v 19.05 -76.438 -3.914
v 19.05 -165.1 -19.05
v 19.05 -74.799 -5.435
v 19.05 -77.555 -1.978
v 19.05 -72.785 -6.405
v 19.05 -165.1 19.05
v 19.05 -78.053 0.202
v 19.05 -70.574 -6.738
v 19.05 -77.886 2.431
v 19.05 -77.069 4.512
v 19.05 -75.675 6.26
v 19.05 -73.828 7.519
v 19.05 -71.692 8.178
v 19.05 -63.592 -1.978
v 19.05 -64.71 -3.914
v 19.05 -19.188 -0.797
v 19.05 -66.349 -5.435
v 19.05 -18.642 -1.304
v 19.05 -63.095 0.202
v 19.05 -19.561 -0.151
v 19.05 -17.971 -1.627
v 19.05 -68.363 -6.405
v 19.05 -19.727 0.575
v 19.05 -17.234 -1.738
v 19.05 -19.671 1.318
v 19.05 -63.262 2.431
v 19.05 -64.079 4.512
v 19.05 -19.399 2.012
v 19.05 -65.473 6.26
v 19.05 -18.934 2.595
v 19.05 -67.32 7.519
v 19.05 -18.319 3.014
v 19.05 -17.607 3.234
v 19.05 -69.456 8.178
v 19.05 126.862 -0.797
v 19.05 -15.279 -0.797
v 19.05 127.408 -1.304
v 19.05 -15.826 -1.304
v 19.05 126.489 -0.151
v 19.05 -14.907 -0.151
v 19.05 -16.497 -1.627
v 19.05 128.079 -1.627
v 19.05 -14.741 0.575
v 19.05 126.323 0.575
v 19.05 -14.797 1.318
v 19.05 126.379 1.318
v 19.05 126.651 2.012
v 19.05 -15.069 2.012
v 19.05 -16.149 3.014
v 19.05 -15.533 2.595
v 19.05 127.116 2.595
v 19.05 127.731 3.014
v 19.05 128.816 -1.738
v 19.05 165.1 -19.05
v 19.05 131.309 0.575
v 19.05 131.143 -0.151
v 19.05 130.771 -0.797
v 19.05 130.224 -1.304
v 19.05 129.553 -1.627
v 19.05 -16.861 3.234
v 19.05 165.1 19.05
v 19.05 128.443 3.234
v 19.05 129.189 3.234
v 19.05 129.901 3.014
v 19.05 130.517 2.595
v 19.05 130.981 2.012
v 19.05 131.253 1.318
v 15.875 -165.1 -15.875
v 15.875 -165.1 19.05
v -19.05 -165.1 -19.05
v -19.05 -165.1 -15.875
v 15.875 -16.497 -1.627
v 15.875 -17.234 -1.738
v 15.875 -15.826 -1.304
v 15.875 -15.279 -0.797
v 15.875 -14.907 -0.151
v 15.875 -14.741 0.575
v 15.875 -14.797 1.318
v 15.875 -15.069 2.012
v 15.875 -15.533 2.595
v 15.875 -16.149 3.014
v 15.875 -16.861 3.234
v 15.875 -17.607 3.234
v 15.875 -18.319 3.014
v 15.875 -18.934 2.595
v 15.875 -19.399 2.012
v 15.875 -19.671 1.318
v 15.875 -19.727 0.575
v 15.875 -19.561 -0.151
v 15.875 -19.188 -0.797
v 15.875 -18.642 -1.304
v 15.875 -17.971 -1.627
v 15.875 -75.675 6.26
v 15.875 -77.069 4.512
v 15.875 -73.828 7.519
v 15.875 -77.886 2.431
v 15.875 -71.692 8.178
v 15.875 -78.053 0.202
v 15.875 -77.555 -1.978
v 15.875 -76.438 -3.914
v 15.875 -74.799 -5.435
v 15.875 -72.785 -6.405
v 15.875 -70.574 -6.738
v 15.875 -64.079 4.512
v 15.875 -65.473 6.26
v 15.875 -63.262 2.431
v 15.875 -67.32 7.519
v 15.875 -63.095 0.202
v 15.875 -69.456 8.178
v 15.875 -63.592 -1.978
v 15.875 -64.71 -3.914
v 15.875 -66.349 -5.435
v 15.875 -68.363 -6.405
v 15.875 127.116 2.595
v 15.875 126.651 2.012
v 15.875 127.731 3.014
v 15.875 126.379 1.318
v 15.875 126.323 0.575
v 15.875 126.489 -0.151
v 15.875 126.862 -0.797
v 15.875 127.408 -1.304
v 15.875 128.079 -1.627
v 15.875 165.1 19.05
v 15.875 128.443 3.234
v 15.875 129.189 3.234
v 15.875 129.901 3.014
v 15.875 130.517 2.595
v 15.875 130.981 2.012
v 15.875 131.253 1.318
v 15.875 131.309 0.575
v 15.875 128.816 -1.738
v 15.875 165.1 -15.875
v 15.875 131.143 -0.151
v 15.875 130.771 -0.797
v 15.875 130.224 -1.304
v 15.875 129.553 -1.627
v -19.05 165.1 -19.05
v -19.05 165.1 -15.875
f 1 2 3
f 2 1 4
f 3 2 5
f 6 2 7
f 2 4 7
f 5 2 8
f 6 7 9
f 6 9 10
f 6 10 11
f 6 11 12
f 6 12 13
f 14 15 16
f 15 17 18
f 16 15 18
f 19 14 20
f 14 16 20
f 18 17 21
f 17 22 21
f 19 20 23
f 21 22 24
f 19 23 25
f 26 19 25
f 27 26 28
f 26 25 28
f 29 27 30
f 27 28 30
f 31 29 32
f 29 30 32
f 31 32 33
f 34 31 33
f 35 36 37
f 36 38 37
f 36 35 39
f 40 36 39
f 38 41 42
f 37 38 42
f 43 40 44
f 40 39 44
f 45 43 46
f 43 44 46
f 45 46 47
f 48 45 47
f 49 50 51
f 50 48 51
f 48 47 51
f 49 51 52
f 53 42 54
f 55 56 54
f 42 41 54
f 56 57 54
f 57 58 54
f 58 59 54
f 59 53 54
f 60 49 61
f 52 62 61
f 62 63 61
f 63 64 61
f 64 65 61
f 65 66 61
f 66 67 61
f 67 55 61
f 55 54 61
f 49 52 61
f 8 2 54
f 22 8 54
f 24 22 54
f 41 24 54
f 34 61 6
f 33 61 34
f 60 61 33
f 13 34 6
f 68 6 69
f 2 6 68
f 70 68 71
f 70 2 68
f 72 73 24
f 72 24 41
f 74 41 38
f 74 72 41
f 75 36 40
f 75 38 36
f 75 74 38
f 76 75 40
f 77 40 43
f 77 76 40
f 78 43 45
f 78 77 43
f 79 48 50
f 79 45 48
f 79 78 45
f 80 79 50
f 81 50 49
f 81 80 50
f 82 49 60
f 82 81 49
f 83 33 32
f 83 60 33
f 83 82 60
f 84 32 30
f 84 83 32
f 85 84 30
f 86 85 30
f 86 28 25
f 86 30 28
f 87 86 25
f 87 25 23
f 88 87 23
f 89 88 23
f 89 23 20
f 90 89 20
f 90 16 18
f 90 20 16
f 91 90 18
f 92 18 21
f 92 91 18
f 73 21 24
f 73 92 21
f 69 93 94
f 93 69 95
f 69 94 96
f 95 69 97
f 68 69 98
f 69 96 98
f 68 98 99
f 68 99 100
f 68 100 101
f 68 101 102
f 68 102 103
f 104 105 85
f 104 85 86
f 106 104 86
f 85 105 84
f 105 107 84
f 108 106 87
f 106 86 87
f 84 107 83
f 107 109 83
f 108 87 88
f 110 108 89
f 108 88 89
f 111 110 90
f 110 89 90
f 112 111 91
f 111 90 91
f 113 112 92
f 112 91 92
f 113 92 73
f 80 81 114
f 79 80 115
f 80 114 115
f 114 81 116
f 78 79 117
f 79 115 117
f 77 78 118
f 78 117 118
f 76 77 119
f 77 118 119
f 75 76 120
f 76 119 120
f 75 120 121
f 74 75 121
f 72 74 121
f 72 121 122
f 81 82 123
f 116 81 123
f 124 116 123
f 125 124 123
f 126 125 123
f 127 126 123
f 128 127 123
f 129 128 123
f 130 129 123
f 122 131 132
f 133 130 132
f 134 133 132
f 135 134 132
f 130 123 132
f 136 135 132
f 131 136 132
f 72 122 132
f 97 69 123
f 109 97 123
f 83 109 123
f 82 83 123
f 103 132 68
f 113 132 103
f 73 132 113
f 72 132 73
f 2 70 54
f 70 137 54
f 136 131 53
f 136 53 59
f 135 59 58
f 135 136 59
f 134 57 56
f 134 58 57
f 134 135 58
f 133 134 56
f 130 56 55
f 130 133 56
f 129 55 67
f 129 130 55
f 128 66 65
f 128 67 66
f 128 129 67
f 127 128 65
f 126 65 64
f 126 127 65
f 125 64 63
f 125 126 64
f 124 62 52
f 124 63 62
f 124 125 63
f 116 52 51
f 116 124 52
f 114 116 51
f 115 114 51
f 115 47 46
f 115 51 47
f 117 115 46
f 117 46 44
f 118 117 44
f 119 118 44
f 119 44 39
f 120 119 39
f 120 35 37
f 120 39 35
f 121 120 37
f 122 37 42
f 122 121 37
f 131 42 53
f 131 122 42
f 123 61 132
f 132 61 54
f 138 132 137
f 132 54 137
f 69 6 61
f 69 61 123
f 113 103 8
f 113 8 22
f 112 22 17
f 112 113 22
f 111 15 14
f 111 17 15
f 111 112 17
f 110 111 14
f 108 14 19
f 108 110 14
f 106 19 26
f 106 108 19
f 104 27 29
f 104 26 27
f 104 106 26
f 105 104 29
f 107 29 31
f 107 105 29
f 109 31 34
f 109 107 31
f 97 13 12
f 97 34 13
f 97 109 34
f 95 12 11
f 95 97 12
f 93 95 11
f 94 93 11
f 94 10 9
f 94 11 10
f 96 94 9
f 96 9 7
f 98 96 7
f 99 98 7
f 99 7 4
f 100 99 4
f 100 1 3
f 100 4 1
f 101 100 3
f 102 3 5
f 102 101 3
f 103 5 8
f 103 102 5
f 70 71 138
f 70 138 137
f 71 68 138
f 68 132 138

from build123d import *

# Parameters (mm, degrees)
BOSS_EXTRUDE1_DEPTH     = 165.1
CUT_EXTRUDE1_DEPTH      = 171.506664093
CUT_EXTRUDE1_DEPTH_BACK = 171.506664093
SKETCH2_R               = 2.5
SKETCH2_R_2             = 7.5


with BuildPart() as part:
    # Sketch1 → Boss-Extrude1 (new, symmetric)
    with BuildSketch(Plane(origin=(0, 0, 0), x_dir=(1, 0, 0), z_dir=(0, 1, 0))):
        Polygon((15.875, -19.05), (15.875, 15.875), (-19.05, 15.875), (-19.05, 19.05), (19.05, 19.05), (19.05, -19.05), align=None)
    extrude(amount=BOSS_EXTRUDE1_DEPTH, both=True)

    # Sketch2 → Cut-Extrude1 (cut, two sides: drawn at the far end of the back side and taken through both)
    with BuildSketch(Plane(origin=(19.05, 0, 0), x_dir=(0, 0, -1), z_dir=(1, 0, 0)).offset(-CUT_EXTRUDE1_DEPTH_BACK)):
        with Locations((-32.722, 128.8161)):
            Circle(SKETCH2_R)
        with Locations((-32.722, 201.3839)):
            Circle(SKETCH2_R_2)
        with Locations((-32.722, -17.2339)):
            Circle(SKETCH2_R)
        with Locations((-32.722, -70.5739)):
            Circle(SKETCH2_R_2)
        with Locations((-0.762, -70.5739)):
            Circle(SKETCH2_R_2)
        with Locations((-0.762, 201.3839)):
            Circle(SKETCH2_R_2)
        with Locations((-0.762, 128.8161)):
            Circle(SKETCH2_R)
        with Locations((-0.762, -17.2339)):
            Circle(SKETCH2_R)
    extrude(amount=CUT_EXTRUDE1_DEPTH + CUT_EXTRUDE1_DEPTH_BACK, mode=Mode.SUBTRACT)


solid = part.part
